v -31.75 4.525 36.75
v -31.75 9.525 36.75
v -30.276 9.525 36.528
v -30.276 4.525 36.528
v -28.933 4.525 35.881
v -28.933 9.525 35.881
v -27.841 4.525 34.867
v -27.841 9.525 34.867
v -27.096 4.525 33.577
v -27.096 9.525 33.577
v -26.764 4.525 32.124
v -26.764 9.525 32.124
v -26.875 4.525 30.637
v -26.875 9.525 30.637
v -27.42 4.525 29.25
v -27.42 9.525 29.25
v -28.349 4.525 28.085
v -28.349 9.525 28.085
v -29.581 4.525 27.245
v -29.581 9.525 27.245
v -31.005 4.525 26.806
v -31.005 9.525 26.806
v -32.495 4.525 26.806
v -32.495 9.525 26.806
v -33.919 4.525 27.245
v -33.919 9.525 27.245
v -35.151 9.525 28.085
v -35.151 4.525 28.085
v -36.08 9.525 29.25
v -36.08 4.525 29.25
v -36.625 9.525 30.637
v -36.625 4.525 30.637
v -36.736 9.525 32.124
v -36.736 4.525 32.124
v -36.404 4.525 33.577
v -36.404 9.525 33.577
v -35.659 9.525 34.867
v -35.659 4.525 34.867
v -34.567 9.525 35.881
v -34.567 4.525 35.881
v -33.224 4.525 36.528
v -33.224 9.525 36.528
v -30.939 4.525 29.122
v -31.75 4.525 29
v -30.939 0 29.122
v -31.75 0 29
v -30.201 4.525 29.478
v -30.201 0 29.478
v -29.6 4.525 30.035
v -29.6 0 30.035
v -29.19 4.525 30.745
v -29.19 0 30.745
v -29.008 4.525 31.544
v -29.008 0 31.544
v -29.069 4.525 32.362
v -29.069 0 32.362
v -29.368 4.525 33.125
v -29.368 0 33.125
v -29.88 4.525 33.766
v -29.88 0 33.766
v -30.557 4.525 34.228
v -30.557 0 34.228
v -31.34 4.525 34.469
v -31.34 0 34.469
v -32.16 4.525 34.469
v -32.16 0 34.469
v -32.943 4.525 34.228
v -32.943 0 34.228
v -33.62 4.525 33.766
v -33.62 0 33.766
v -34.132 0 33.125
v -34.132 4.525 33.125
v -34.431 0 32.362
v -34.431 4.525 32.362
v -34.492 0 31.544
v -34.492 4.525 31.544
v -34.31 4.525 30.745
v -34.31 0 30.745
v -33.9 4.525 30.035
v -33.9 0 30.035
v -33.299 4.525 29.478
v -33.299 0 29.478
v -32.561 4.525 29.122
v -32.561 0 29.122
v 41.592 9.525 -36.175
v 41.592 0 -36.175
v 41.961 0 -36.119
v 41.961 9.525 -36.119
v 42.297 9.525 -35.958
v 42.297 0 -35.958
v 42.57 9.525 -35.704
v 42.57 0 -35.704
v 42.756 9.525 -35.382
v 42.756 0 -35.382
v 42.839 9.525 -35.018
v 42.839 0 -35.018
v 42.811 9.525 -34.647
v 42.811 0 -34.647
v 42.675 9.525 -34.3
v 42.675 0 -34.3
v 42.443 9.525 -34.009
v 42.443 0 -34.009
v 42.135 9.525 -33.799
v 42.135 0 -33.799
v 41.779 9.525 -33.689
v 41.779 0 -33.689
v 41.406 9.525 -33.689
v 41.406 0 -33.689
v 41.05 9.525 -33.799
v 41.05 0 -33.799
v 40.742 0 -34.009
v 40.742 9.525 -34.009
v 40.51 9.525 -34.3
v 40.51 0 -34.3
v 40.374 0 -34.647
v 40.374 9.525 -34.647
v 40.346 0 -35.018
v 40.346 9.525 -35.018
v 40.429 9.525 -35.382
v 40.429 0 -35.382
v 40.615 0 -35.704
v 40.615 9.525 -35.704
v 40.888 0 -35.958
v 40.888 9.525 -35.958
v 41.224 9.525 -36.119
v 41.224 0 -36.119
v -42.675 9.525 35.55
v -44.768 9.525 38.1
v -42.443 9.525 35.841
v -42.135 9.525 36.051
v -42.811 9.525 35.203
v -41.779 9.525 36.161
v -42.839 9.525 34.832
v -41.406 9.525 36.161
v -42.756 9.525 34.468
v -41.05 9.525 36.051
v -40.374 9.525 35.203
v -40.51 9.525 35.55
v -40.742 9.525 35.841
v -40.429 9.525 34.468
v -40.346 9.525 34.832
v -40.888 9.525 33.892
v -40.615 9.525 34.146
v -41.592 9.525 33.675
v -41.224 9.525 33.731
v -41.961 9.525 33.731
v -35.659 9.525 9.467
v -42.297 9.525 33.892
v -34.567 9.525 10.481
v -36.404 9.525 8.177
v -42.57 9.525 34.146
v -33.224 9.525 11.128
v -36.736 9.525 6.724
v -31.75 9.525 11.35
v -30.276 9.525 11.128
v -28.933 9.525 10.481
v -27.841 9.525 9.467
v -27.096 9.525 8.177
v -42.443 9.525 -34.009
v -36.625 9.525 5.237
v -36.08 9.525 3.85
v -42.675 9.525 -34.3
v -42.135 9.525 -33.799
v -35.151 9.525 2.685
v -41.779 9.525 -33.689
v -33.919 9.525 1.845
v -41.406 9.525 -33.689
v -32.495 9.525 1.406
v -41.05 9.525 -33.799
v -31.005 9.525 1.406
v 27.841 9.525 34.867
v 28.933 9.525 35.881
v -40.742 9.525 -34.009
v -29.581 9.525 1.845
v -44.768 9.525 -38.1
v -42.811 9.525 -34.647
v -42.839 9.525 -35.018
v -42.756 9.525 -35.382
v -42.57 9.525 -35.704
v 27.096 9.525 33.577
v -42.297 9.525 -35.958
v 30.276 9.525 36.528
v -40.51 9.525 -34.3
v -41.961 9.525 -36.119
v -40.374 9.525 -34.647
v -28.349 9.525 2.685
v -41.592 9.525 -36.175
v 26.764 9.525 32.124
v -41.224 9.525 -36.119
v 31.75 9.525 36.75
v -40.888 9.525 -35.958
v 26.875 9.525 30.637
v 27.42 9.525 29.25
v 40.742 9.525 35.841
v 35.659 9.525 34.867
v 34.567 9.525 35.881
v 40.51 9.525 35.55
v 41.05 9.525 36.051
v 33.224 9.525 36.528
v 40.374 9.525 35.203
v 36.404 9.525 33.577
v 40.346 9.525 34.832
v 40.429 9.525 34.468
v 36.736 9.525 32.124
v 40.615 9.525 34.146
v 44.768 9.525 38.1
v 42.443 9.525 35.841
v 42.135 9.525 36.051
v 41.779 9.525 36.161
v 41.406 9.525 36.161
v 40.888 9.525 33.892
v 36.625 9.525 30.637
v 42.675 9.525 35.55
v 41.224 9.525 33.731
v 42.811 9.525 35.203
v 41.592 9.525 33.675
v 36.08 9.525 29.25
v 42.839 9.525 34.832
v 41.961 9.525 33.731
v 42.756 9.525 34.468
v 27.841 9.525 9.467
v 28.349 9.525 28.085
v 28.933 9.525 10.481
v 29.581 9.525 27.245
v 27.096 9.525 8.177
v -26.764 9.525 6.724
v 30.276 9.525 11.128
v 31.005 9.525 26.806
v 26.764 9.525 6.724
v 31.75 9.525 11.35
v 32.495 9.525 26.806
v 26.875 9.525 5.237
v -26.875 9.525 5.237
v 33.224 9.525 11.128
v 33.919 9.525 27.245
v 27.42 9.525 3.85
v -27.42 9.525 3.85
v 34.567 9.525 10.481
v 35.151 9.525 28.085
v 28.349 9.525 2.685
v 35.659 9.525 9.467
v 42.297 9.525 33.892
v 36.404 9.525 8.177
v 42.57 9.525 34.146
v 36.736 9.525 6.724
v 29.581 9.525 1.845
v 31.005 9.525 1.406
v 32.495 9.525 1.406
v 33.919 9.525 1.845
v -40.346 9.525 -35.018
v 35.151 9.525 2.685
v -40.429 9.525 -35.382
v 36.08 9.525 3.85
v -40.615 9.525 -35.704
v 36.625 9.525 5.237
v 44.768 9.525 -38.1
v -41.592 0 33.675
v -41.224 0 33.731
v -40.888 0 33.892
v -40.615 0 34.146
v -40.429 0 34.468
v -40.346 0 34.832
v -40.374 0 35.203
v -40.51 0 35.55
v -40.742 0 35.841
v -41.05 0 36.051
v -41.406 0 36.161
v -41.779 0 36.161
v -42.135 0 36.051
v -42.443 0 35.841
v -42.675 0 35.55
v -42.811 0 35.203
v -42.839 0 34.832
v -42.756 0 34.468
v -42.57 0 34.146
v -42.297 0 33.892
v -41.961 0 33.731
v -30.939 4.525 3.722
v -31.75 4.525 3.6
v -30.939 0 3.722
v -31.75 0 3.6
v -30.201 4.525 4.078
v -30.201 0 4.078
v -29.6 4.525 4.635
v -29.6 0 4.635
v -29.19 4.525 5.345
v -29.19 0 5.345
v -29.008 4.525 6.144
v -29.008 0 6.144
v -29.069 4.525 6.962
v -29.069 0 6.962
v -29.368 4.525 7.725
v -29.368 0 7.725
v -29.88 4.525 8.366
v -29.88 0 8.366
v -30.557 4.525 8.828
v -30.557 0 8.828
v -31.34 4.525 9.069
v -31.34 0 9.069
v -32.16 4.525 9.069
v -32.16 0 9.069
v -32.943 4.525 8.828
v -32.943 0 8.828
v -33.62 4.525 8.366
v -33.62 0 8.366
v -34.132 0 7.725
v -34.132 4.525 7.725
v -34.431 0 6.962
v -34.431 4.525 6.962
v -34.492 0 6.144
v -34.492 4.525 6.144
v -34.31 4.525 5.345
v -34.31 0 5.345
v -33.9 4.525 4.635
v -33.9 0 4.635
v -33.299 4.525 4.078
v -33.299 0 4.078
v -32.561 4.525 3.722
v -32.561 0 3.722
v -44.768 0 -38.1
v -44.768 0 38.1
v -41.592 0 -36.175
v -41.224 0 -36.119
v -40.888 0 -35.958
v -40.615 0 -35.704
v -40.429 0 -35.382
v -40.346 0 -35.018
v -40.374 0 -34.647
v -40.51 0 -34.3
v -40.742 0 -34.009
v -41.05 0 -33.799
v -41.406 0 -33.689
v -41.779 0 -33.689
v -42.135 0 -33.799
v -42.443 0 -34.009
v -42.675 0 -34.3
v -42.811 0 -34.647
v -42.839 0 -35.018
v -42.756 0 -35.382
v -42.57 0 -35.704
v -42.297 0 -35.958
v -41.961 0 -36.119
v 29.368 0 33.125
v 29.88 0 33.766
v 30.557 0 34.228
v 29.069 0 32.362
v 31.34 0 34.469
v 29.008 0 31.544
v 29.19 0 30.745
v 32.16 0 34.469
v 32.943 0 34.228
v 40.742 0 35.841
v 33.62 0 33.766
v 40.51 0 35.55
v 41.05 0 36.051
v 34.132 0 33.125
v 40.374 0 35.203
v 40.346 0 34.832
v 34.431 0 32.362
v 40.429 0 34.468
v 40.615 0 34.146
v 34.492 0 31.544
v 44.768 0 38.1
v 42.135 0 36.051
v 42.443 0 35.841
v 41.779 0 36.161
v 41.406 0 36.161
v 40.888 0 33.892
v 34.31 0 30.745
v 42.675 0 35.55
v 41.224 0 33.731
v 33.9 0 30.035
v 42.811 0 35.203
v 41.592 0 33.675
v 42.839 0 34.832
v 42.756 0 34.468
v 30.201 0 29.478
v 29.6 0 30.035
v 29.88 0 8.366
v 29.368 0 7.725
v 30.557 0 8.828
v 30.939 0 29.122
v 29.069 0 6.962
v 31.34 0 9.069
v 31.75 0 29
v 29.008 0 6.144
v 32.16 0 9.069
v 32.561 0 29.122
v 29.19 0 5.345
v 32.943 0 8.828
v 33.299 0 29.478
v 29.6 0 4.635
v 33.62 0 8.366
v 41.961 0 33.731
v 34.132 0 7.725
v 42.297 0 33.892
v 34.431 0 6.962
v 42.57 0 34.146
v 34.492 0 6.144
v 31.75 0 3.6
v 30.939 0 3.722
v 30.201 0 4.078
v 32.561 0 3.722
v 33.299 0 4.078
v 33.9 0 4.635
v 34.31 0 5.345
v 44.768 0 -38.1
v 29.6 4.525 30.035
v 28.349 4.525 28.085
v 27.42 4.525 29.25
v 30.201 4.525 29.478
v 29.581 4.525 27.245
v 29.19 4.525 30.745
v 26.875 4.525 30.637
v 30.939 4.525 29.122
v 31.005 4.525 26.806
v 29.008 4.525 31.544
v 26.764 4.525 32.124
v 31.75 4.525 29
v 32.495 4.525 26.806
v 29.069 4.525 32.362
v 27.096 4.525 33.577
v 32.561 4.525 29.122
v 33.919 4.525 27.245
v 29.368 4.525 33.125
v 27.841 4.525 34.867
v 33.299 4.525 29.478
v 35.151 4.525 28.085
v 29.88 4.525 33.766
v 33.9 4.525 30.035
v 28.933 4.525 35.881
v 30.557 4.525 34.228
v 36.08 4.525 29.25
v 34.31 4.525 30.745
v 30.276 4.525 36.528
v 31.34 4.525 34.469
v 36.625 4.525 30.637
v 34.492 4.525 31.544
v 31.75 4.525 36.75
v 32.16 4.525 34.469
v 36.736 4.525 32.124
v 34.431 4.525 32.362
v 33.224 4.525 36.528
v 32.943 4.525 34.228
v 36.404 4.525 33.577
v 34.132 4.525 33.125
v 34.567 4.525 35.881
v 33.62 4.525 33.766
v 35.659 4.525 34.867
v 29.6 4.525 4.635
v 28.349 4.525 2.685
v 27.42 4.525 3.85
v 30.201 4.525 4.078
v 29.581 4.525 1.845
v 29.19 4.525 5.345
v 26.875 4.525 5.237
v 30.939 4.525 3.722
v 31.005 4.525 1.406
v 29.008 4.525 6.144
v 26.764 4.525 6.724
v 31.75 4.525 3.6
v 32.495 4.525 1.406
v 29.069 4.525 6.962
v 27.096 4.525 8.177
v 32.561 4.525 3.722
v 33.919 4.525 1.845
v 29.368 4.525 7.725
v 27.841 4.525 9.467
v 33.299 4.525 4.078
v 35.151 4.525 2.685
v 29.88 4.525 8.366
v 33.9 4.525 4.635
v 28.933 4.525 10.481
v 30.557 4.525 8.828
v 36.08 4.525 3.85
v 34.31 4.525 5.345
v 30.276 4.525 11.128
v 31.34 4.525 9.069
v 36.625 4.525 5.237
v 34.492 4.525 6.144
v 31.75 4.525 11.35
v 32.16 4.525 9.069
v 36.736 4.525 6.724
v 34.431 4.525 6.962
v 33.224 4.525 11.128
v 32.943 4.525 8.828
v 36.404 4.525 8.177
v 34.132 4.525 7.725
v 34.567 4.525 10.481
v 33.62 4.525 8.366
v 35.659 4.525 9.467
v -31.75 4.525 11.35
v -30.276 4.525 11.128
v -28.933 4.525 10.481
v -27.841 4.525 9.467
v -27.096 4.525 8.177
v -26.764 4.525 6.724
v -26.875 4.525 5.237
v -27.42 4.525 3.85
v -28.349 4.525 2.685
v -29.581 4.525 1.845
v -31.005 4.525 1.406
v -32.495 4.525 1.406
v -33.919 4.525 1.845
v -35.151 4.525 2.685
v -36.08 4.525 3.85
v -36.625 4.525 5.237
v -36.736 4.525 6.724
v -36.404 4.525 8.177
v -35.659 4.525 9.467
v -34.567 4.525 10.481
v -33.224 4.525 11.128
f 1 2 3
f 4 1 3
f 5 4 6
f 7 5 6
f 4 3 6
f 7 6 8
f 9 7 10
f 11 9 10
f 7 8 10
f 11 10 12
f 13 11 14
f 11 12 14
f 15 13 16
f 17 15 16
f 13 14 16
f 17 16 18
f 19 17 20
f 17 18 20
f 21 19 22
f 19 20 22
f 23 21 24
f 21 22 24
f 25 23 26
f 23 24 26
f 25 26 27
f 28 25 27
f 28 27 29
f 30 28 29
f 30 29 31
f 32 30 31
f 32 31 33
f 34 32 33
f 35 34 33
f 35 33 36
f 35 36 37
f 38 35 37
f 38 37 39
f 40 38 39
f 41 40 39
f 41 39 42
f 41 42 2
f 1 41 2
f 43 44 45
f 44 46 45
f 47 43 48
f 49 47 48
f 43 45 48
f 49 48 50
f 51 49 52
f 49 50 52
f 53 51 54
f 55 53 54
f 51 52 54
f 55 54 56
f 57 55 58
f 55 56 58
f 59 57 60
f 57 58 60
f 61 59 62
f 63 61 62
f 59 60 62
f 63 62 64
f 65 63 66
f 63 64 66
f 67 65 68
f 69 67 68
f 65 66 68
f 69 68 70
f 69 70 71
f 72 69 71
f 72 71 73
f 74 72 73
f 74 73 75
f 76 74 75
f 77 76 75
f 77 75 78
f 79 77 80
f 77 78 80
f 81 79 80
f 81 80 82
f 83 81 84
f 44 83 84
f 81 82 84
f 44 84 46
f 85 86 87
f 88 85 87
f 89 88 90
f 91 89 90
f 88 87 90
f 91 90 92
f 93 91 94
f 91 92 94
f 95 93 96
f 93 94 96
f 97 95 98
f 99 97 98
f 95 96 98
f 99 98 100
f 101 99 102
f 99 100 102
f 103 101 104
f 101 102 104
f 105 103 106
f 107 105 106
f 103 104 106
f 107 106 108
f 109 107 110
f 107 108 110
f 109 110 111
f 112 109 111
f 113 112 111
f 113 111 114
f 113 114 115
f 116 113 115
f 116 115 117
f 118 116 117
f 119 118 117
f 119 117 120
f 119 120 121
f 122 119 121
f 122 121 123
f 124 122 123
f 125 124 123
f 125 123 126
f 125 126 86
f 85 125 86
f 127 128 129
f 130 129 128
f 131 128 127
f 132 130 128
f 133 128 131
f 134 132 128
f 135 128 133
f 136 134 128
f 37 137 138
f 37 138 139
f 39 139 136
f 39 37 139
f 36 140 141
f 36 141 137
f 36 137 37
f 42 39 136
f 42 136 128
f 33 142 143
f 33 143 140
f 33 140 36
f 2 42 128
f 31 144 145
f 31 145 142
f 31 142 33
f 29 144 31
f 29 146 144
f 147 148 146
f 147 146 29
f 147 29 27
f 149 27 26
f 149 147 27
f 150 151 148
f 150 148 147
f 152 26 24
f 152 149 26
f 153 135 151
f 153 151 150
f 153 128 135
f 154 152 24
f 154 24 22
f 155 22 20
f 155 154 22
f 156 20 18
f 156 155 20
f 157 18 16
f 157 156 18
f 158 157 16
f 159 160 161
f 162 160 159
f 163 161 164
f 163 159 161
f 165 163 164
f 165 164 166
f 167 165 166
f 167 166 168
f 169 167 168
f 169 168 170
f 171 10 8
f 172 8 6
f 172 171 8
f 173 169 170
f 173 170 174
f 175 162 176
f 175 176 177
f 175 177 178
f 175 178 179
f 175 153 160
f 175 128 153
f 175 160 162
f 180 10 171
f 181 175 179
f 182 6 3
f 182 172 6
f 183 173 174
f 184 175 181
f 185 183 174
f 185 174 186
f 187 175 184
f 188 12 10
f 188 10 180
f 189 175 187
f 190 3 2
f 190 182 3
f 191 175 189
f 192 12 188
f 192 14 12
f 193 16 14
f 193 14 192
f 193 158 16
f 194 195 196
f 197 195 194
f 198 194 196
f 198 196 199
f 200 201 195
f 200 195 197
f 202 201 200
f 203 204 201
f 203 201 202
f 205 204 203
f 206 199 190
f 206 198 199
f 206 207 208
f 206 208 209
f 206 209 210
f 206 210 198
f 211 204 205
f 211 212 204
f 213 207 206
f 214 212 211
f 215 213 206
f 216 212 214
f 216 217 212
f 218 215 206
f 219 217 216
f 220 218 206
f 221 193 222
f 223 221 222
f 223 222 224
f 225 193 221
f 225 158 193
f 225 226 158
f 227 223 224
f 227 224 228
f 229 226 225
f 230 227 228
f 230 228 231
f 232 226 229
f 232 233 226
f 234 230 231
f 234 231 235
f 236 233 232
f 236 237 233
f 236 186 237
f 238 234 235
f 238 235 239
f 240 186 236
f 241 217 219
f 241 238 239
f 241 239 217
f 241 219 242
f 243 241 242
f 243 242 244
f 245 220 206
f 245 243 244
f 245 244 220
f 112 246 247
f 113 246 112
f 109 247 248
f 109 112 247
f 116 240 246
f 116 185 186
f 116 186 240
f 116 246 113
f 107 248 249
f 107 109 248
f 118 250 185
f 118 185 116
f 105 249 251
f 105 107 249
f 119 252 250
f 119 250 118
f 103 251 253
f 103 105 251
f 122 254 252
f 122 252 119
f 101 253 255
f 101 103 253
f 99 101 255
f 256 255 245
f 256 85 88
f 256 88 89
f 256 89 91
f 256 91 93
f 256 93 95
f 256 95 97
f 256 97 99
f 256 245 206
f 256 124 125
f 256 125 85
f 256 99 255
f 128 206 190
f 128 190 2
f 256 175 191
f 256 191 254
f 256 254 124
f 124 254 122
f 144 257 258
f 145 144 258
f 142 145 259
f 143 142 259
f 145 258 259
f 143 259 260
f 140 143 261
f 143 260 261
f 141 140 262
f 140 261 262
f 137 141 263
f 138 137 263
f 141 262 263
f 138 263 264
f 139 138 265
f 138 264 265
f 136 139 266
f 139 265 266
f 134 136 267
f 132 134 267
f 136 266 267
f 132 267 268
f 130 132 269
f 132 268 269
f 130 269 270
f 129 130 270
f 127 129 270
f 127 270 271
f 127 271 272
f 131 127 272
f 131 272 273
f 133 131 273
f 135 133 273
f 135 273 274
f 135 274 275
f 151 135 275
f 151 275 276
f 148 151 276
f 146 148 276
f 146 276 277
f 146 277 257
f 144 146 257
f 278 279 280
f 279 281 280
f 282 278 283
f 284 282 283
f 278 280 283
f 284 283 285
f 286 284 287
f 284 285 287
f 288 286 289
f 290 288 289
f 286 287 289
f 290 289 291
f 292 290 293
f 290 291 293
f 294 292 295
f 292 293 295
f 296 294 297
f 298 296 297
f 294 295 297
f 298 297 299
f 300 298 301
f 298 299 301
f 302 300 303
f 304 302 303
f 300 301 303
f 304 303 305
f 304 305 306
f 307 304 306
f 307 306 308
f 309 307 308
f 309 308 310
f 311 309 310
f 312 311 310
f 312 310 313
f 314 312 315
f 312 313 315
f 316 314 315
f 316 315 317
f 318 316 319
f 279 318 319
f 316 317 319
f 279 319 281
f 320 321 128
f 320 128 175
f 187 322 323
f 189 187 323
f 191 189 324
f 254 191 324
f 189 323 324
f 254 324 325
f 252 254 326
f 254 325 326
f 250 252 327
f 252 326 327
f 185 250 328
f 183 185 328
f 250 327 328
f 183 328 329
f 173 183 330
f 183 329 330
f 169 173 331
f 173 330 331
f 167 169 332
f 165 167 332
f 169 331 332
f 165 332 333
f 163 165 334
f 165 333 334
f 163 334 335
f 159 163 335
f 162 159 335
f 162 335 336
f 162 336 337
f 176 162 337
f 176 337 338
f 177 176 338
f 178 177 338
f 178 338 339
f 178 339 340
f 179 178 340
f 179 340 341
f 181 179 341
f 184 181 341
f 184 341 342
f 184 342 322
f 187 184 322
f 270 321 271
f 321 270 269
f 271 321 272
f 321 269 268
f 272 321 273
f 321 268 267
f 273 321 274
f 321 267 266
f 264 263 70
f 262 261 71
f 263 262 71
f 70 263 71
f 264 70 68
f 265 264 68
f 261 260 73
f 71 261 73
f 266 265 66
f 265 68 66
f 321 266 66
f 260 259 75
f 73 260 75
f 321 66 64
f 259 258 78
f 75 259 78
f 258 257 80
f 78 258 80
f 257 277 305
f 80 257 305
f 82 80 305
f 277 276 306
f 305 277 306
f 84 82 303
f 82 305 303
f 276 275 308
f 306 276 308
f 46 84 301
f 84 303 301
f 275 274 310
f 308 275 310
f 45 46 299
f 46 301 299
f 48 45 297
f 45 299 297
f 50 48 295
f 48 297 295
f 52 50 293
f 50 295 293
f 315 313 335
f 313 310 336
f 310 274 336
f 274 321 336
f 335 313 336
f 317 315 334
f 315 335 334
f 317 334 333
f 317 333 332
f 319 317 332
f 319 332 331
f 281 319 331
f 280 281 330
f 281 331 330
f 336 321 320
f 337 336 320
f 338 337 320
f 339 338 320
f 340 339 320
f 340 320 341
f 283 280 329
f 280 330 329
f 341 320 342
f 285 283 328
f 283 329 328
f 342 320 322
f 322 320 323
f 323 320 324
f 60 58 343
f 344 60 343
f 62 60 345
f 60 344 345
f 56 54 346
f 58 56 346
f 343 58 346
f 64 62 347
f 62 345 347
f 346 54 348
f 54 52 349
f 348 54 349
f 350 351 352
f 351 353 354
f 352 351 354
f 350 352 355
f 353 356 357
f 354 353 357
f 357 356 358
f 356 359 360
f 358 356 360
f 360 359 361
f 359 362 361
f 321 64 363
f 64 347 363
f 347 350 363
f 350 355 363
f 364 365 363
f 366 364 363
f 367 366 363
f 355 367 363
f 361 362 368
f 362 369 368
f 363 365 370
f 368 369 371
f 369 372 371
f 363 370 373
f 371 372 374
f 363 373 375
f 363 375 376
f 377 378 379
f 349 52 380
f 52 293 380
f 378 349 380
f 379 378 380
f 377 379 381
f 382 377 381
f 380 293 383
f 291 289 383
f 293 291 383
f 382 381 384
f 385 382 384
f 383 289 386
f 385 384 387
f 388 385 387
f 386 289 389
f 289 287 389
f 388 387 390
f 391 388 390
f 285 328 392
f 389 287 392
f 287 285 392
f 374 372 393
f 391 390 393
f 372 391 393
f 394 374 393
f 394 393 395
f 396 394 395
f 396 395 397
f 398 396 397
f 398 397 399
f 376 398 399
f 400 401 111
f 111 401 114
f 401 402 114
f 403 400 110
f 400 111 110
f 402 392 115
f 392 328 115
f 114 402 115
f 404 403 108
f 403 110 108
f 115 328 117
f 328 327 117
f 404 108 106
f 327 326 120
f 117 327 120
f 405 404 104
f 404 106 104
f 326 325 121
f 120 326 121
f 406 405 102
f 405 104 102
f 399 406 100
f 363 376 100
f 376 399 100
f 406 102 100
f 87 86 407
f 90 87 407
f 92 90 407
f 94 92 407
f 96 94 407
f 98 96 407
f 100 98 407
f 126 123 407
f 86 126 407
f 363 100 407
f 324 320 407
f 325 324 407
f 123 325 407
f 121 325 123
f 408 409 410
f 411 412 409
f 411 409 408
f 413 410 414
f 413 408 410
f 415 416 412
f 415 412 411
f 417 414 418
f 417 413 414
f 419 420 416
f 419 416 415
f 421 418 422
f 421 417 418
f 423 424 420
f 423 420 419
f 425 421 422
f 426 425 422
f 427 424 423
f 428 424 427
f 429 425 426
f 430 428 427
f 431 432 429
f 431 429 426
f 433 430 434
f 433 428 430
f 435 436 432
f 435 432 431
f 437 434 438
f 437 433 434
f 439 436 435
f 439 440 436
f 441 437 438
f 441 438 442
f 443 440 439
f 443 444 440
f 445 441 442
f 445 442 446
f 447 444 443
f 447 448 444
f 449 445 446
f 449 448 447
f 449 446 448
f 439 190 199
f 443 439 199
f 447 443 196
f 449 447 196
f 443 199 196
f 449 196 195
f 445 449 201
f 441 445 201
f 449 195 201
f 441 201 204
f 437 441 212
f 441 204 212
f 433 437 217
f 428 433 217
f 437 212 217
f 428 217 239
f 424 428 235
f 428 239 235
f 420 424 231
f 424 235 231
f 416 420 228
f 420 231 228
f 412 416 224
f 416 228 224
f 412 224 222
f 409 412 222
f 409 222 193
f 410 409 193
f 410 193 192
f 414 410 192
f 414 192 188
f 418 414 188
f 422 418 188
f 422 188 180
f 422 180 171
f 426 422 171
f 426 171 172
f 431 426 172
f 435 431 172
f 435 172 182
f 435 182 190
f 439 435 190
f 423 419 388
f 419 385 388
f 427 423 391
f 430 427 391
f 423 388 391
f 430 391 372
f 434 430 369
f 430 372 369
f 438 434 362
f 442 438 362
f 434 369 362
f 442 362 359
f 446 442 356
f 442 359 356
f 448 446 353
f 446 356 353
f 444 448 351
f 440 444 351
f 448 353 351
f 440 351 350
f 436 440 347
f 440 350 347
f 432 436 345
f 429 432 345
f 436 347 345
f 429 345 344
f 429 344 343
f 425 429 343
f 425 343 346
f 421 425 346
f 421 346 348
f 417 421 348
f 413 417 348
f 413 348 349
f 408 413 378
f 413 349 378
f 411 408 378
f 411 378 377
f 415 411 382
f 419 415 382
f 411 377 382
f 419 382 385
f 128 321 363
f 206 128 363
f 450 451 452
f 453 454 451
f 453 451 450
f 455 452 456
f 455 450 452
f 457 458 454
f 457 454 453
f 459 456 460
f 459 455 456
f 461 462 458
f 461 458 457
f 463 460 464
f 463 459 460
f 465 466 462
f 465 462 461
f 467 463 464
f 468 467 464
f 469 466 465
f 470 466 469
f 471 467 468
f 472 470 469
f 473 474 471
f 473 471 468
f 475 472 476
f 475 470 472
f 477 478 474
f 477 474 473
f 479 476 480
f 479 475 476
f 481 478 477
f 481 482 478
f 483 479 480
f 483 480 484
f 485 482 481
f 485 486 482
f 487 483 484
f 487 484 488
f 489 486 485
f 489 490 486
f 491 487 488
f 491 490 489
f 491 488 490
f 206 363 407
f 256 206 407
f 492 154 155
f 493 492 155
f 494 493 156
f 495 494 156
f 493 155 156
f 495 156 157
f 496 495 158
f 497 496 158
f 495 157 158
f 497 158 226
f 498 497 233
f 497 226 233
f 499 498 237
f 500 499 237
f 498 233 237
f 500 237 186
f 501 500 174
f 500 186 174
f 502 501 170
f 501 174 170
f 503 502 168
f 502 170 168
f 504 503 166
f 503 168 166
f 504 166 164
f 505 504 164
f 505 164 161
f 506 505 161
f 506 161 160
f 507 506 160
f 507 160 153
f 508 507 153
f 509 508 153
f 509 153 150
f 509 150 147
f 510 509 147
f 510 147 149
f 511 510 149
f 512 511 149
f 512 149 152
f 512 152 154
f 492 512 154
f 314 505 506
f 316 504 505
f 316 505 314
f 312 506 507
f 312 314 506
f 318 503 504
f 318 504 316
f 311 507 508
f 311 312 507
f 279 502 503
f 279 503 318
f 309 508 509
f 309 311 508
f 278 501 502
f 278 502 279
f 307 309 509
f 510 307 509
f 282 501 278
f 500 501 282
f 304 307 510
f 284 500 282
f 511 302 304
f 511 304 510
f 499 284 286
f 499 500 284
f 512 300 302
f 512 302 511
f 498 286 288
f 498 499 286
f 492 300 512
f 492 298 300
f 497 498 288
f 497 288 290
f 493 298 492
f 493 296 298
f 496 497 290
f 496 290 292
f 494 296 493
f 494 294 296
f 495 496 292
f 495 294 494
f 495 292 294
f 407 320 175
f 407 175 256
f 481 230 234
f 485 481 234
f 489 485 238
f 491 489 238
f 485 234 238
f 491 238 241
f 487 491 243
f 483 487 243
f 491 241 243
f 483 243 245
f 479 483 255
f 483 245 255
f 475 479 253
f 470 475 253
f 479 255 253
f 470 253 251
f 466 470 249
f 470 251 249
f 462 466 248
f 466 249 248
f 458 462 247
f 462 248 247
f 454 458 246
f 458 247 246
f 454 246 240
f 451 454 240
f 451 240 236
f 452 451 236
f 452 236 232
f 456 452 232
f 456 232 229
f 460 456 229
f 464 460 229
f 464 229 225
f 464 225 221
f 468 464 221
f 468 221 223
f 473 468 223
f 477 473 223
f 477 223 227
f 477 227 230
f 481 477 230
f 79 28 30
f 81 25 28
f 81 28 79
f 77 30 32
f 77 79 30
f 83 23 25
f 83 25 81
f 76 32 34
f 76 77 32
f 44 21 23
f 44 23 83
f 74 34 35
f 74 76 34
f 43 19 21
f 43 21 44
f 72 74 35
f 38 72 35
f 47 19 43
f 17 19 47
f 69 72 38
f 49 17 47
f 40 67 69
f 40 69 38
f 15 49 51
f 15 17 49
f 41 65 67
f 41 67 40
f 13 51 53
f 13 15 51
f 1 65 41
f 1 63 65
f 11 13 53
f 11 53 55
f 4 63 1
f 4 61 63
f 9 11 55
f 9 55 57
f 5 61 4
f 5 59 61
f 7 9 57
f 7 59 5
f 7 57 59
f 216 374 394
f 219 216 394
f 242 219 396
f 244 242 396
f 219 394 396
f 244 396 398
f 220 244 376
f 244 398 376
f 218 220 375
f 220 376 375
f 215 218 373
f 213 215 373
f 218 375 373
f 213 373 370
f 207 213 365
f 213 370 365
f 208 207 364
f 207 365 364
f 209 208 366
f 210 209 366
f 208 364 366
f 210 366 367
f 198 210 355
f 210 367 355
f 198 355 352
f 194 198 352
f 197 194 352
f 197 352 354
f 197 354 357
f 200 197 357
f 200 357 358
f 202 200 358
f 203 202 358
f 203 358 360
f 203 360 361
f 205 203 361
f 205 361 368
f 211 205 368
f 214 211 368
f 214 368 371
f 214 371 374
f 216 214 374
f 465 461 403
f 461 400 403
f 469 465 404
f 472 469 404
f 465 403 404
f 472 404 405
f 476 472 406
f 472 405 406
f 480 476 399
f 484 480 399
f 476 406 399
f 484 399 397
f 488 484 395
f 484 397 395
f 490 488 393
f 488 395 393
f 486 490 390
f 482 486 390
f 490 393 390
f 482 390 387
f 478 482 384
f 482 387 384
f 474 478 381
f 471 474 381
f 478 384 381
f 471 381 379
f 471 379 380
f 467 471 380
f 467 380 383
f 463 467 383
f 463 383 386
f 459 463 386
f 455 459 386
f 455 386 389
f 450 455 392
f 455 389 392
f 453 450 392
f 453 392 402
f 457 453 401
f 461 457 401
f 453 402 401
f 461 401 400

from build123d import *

# Parameters (mm, degrees)
SKETCH1_W                      = 89.535
SKETCH1_H                      = 76.2
EXTRUDE1_DEPTH                 = 9.525
CBORE_FOR_M5_SHCS3_D           = 5.5
CBORE_FOR_M5_SHCS3_CBORE_D     = 10
CBORE_FOR_M5_SHCS3_CBORE_DEPTH = 5
LPATTERN4_COUNT                = 2
LPATTERN4_PITCH                = 63.5
LPATTERN4_COUNT_DIR2           = 2
LPATTERN4_PITCH_DIR2           = 25.4
M3X0_5_TAPPED_HOLE2_D          = 2.5
LPATTERN5_COUNT                = 2
LPATTERN5_PITCH                = 83.185
LPATTERN5_COUNT_DIR2           = 2
LPATTERN5_PITCH_DIR2           = 69.85


with BuildPart() as part:
    # Sketch1 → Extrude1 (new body)
    with BuildSketch(Plane(origin=(0, 0, 0), x_dir=(1, 0, 0), z_dir=(0, 1, 0))):
        Rectangle(SKETCH1_W, SKETCH1_H)
    extrude(amount=EXTRUDE1_DEPTH)

    # CBORE for M5 SHCS3 (through all)
    with Locations(Plane(origin=(-31.75, 9.525, 31.75), x_dir=(0, 0, 1), z_dir=(0, 1, 0))):
        with Locations((0, 0)):
            cbore_for_m5_shcs3 = CounterBoreHole(CBORE_FOR_M5_SHCS3_D / 2, CBORE_FOR_M5_SHCS3_CBORE_D / 2, CBORE_FOR_M5_SHCS3_CBORE_DEPTH)

    # LPattern4: CBORE for M5 SHCS3 2 × 2
    with Locations(*[(i * LPATTERN4_PITCH, 0, -j * LPATTERN4_PITCH_DIR2) for i in range(LPATTERN4_COUNT) for j in range(LPATTERN4_COUNT_DIR2) if (i, j) != (0, 0)]):
        add(cbore_for_m5_shcs3, mode=Mode.SUBTRACT)

    # M3x0.5 Tapped Hole2 (through all)
    with Locations(Plane(origin=(-41.5925, 9.525, 34.925), x_dir=(0, 0, 1), z_dir=(0, 1, 0))):
        with Locations((0, 0)):
            m3x0_5_tapped_hole2 = Hole(M3X0_5_TAPPED_HOLE2_D / 2)

    # LPattern5: M3x0.5 Tapped Hole2 2 × 2
    with Locations(*[(i * LPATTERN5_PITCH, 0, -j * LPATTERN5_PITCH_DIR2) for i in range(LPATTERN5_COUNT) for j in range(LPATTERN5_COUNT_DIR2) if (i, j) != (0, 0)]):
        add(m3x0_5_tapped_hole2, mode=Mode.SUBTRACT)


solid = part.part
